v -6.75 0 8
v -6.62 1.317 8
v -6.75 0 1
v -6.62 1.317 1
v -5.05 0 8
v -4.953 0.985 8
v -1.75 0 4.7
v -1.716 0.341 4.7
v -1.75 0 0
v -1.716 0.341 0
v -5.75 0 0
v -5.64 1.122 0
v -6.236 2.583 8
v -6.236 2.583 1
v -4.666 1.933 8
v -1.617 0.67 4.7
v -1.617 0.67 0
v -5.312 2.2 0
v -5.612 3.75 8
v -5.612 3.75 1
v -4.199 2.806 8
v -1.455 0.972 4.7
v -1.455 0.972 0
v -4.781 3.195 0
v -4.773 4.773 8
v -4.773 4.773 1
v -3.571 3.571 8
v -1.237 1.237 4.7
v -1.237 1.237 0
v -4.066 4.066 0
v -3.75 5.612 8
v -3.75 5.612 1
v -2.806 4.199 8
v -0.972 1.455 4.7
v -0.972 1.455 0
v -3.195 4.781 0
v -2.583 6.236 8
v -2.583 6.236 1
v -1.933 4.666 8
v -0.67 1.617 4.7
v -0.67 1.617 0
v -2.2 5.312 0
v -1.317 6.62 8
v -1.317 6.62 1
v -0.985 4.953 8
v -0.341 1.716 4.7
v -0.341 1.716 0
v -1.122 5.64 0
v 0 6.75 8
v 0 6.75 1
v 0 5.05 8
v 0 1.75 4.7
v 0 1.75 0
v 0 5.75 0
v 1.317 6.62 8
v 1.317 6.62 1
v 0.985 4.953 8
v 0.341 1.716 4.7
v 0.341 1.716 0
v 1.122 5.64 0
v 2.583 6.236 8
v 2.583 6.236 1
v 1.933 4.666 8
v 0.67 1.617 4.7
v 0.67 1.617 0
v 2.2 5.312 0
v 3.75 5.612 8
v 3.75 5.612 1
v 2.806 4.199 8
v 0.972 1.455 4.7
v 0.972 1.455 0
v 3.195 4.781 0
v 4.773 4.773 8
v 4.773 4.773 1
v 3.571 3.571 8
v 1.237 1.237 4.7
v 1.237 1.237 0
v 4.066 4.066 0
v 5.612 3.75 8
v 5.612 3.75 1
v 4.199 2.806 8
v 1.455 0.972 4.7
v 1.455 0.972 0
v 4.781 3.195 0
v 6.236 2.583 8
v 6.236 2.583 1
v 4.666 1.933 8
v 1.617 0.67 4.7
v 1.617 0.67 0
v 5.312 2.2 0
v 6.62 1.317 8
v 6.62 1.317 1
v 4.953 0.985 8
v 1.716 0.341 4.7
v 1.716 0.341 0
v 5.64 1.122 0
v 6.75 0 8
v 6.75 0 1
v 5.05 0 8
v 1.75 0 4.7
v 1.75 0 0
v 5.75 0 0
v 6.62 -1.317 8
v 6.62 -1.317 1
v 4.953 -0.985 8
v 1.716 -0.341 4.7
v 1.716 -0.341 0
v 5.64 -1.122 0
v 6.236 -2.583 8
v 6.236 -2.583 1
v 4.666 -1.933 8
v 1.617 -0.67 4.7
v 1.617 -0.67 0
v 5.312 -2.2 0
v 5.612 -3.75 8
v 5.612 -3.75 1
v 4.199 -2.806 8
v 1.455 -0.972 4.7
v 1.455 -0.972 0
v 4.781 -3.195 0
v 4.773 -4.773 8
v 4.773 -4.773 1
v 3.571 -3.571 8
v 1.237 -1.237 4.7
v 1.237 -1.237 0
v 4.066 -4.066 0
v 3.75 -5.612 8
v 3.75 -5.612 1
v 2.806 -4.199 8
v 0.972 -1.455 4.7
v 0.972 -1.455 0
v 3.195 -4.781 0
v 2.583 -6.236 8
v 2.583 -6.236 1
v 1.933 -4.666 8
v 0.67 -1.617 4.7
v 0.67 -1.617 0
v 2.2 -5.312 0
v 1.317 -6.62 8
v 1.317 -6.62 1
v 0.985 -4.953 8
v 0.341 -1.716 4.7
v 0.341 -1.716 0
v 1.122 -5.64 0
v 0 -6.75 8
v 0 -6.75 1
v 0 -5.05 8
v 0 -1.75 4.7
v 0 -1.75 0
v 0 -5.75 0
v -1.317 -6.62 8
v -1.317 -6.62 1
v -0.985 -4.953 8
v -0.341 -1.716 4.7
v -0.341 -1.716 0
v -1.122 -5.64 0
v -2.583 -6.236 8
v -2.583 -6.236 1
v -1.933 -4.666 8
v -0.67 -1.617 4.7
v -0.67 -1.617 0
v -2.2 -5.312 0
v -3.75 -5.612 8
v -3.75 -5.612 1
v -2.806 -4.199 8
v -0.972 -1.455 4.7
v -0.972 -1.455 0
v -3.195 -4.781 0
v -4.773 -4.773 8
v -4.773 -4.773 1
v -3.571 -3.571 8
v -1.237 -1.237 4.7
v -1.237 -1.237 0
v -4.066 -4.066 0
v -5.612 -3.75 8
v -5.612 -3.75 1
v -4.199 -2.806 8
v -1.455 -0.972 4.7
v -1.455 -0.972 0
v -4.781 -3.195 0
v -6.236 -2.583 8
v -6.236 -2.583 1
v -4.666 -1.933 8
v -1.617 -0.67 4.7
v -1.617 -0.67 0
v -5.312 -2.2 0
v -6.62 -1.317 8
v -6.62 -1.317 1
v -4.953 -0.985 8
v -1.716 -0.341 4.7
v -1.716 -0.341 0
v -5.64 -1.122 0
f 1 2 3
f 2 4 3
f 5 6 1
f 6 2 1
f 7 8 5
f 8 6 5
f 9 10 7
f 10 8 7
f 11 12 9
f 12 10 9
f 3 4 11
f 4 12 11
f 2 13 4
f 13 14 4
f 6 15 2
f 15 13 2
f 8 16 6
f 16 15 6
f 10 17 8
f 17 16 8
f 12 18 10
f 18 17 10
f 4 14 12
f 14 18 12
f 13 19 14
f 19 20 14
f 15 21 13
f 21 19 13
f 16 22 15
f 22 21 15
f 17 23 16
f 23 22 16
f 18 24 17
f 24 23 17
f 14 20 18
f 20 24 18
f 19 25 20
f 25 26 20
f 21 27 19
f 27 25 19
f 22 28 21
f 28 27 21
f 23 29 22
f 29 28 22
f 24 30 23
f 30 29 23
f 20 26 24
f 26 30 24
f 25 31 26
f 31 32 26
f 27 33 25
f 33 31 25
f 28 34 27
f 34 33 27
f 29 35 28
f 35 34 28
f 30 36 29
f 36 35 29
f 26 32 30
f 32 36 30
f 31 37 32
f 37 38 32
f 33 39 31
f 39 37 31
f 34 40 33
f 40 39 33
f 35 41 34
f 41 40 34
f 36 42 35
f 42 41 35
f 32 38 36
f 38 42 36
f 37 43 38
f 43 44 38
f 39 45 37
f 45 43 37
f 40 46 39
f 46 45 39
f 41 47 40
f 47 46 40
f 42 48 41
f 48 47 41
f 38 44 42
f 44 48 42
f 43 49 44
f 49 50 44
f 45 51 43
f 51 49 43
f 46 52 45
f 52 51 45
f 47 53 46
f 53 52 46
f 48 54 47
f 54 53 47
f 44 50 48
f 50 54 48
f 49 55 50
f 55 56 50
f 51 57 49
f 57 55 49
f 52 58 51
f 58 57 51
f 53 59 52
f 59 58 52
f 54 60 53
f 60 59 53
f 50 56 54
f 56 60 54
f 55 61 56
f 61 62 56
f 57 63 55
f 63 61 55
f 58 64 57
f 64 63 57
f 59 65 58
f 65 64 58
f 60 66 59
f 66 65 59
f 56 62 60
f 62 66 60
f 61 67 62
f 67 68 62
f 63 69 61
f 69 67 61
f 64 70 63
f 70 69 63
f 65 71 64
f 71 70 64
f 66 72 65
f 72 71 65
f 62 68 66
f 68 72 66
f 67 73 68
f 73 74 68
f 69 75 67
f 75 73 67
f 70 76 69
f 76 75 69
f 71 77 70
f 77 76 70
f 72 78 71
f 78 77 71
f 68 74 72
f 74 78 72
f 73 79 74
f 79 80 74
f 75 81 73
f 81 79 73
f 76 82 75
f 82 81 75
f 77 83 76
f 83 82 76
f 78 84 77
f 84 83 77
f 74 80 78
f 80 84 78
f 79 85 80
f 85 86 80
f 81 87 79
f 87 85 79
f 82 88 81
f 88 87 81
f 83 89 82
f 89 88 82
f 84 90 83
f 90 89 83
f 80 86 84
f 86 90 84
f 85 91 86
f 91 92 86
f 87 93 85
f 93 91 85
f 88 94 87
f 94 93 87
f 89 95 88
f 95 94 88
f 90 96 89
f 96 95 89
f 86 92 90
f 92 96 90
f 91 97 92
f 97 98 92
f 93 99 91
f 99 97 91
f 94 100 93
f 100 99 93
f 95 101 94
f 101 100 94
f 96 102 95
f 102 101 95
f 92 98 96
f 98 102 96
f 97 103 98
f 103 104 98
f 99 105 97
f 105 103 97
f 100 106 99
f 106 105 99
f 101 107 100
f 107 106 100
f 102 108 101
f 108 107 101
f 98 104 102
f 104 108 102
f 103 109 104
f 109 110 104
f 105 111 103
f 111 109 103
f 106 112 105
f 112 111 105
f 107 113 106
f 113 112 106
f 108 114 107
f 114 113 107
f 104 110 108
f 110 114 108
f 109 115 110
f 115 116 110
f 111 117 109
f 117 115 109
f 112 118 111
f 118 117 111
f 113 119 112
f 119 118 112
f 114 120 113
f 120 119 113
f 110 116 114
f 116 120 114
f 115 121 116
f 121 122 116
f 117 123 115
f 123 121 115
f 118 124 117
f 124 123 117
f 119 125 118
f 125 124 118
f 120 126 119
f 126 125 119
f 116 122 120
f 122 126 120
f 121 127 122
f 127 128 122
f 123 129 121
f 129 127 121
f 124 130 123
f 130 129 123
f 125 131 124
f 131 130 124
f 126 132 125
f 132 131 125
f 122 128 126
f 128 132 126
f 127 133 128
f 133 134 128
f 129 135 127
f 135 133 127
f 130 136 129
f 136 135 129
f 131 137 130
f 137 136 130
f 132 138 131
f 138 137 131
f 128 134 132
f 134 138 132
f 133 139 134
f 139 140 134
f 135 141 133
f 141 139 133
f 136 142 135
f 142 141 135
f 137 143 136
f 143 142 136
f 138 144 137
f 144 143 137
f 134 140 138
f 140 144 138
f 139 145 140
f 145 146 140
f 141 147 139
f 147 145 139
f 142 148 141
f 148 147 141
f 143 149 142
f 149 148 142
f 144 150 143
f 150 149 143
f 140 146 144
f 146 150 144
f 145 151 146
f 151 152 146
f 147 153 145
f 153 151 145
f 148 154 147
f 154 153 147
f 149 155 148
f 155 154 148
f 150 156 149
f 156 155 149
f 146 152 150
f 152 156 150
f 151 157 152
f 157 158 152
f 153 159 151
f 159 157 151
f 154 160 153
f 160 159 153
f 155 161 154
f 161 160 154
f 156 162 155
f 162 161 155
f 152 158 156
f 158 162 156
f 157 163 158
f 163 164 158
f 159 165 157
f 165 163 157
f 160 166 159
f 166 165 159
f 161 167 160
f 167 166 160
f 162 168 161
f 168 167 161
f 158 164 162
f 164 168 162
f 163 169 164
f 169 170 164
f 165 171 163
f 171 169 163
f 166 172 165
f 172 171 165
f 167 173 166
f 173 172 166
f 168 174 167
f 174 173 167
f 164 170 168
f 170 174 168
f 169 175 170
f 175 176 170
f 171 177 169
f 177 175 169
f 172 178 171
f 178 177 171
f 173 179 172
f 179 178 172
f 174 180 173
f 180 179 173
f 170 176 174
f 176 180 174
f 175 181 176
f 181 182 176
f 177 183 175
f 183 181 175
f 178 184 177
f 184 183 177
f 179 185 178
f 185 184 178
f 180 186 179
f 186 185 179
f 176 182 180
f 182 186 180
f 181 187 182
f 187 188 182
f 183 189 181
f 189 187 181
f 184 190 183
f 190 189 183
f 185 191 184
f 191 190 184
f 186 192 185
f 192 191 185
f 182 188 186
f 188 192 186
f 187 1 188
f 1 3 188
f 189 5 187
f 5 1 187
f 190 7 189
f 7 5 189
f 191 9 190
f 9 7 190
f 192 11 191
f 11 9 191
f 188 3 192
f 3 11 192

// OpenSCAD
$fn = 32;

// ----------------------------------------------------------------------
// Form washer: countersunk washer, 13.5 mm outside, 3.5 mm bore
// ----------------------------------------------------------------------

// --- parameters (mm) ---
revolve_angle = 360;      // full turn around the Z axis
profile_points = 6;       // points of the closed outline

profile = [[1.75, 0], [5.75, 0], [6.75, 1], [6.75, 8], [5.05, 8], [1.75, 4.7]];  // single closed polygon, 6 points, counter clockwise

// --- the one profile operation ---
rotate_extrude(angle = revolve_angle) polygon(points = profile);
